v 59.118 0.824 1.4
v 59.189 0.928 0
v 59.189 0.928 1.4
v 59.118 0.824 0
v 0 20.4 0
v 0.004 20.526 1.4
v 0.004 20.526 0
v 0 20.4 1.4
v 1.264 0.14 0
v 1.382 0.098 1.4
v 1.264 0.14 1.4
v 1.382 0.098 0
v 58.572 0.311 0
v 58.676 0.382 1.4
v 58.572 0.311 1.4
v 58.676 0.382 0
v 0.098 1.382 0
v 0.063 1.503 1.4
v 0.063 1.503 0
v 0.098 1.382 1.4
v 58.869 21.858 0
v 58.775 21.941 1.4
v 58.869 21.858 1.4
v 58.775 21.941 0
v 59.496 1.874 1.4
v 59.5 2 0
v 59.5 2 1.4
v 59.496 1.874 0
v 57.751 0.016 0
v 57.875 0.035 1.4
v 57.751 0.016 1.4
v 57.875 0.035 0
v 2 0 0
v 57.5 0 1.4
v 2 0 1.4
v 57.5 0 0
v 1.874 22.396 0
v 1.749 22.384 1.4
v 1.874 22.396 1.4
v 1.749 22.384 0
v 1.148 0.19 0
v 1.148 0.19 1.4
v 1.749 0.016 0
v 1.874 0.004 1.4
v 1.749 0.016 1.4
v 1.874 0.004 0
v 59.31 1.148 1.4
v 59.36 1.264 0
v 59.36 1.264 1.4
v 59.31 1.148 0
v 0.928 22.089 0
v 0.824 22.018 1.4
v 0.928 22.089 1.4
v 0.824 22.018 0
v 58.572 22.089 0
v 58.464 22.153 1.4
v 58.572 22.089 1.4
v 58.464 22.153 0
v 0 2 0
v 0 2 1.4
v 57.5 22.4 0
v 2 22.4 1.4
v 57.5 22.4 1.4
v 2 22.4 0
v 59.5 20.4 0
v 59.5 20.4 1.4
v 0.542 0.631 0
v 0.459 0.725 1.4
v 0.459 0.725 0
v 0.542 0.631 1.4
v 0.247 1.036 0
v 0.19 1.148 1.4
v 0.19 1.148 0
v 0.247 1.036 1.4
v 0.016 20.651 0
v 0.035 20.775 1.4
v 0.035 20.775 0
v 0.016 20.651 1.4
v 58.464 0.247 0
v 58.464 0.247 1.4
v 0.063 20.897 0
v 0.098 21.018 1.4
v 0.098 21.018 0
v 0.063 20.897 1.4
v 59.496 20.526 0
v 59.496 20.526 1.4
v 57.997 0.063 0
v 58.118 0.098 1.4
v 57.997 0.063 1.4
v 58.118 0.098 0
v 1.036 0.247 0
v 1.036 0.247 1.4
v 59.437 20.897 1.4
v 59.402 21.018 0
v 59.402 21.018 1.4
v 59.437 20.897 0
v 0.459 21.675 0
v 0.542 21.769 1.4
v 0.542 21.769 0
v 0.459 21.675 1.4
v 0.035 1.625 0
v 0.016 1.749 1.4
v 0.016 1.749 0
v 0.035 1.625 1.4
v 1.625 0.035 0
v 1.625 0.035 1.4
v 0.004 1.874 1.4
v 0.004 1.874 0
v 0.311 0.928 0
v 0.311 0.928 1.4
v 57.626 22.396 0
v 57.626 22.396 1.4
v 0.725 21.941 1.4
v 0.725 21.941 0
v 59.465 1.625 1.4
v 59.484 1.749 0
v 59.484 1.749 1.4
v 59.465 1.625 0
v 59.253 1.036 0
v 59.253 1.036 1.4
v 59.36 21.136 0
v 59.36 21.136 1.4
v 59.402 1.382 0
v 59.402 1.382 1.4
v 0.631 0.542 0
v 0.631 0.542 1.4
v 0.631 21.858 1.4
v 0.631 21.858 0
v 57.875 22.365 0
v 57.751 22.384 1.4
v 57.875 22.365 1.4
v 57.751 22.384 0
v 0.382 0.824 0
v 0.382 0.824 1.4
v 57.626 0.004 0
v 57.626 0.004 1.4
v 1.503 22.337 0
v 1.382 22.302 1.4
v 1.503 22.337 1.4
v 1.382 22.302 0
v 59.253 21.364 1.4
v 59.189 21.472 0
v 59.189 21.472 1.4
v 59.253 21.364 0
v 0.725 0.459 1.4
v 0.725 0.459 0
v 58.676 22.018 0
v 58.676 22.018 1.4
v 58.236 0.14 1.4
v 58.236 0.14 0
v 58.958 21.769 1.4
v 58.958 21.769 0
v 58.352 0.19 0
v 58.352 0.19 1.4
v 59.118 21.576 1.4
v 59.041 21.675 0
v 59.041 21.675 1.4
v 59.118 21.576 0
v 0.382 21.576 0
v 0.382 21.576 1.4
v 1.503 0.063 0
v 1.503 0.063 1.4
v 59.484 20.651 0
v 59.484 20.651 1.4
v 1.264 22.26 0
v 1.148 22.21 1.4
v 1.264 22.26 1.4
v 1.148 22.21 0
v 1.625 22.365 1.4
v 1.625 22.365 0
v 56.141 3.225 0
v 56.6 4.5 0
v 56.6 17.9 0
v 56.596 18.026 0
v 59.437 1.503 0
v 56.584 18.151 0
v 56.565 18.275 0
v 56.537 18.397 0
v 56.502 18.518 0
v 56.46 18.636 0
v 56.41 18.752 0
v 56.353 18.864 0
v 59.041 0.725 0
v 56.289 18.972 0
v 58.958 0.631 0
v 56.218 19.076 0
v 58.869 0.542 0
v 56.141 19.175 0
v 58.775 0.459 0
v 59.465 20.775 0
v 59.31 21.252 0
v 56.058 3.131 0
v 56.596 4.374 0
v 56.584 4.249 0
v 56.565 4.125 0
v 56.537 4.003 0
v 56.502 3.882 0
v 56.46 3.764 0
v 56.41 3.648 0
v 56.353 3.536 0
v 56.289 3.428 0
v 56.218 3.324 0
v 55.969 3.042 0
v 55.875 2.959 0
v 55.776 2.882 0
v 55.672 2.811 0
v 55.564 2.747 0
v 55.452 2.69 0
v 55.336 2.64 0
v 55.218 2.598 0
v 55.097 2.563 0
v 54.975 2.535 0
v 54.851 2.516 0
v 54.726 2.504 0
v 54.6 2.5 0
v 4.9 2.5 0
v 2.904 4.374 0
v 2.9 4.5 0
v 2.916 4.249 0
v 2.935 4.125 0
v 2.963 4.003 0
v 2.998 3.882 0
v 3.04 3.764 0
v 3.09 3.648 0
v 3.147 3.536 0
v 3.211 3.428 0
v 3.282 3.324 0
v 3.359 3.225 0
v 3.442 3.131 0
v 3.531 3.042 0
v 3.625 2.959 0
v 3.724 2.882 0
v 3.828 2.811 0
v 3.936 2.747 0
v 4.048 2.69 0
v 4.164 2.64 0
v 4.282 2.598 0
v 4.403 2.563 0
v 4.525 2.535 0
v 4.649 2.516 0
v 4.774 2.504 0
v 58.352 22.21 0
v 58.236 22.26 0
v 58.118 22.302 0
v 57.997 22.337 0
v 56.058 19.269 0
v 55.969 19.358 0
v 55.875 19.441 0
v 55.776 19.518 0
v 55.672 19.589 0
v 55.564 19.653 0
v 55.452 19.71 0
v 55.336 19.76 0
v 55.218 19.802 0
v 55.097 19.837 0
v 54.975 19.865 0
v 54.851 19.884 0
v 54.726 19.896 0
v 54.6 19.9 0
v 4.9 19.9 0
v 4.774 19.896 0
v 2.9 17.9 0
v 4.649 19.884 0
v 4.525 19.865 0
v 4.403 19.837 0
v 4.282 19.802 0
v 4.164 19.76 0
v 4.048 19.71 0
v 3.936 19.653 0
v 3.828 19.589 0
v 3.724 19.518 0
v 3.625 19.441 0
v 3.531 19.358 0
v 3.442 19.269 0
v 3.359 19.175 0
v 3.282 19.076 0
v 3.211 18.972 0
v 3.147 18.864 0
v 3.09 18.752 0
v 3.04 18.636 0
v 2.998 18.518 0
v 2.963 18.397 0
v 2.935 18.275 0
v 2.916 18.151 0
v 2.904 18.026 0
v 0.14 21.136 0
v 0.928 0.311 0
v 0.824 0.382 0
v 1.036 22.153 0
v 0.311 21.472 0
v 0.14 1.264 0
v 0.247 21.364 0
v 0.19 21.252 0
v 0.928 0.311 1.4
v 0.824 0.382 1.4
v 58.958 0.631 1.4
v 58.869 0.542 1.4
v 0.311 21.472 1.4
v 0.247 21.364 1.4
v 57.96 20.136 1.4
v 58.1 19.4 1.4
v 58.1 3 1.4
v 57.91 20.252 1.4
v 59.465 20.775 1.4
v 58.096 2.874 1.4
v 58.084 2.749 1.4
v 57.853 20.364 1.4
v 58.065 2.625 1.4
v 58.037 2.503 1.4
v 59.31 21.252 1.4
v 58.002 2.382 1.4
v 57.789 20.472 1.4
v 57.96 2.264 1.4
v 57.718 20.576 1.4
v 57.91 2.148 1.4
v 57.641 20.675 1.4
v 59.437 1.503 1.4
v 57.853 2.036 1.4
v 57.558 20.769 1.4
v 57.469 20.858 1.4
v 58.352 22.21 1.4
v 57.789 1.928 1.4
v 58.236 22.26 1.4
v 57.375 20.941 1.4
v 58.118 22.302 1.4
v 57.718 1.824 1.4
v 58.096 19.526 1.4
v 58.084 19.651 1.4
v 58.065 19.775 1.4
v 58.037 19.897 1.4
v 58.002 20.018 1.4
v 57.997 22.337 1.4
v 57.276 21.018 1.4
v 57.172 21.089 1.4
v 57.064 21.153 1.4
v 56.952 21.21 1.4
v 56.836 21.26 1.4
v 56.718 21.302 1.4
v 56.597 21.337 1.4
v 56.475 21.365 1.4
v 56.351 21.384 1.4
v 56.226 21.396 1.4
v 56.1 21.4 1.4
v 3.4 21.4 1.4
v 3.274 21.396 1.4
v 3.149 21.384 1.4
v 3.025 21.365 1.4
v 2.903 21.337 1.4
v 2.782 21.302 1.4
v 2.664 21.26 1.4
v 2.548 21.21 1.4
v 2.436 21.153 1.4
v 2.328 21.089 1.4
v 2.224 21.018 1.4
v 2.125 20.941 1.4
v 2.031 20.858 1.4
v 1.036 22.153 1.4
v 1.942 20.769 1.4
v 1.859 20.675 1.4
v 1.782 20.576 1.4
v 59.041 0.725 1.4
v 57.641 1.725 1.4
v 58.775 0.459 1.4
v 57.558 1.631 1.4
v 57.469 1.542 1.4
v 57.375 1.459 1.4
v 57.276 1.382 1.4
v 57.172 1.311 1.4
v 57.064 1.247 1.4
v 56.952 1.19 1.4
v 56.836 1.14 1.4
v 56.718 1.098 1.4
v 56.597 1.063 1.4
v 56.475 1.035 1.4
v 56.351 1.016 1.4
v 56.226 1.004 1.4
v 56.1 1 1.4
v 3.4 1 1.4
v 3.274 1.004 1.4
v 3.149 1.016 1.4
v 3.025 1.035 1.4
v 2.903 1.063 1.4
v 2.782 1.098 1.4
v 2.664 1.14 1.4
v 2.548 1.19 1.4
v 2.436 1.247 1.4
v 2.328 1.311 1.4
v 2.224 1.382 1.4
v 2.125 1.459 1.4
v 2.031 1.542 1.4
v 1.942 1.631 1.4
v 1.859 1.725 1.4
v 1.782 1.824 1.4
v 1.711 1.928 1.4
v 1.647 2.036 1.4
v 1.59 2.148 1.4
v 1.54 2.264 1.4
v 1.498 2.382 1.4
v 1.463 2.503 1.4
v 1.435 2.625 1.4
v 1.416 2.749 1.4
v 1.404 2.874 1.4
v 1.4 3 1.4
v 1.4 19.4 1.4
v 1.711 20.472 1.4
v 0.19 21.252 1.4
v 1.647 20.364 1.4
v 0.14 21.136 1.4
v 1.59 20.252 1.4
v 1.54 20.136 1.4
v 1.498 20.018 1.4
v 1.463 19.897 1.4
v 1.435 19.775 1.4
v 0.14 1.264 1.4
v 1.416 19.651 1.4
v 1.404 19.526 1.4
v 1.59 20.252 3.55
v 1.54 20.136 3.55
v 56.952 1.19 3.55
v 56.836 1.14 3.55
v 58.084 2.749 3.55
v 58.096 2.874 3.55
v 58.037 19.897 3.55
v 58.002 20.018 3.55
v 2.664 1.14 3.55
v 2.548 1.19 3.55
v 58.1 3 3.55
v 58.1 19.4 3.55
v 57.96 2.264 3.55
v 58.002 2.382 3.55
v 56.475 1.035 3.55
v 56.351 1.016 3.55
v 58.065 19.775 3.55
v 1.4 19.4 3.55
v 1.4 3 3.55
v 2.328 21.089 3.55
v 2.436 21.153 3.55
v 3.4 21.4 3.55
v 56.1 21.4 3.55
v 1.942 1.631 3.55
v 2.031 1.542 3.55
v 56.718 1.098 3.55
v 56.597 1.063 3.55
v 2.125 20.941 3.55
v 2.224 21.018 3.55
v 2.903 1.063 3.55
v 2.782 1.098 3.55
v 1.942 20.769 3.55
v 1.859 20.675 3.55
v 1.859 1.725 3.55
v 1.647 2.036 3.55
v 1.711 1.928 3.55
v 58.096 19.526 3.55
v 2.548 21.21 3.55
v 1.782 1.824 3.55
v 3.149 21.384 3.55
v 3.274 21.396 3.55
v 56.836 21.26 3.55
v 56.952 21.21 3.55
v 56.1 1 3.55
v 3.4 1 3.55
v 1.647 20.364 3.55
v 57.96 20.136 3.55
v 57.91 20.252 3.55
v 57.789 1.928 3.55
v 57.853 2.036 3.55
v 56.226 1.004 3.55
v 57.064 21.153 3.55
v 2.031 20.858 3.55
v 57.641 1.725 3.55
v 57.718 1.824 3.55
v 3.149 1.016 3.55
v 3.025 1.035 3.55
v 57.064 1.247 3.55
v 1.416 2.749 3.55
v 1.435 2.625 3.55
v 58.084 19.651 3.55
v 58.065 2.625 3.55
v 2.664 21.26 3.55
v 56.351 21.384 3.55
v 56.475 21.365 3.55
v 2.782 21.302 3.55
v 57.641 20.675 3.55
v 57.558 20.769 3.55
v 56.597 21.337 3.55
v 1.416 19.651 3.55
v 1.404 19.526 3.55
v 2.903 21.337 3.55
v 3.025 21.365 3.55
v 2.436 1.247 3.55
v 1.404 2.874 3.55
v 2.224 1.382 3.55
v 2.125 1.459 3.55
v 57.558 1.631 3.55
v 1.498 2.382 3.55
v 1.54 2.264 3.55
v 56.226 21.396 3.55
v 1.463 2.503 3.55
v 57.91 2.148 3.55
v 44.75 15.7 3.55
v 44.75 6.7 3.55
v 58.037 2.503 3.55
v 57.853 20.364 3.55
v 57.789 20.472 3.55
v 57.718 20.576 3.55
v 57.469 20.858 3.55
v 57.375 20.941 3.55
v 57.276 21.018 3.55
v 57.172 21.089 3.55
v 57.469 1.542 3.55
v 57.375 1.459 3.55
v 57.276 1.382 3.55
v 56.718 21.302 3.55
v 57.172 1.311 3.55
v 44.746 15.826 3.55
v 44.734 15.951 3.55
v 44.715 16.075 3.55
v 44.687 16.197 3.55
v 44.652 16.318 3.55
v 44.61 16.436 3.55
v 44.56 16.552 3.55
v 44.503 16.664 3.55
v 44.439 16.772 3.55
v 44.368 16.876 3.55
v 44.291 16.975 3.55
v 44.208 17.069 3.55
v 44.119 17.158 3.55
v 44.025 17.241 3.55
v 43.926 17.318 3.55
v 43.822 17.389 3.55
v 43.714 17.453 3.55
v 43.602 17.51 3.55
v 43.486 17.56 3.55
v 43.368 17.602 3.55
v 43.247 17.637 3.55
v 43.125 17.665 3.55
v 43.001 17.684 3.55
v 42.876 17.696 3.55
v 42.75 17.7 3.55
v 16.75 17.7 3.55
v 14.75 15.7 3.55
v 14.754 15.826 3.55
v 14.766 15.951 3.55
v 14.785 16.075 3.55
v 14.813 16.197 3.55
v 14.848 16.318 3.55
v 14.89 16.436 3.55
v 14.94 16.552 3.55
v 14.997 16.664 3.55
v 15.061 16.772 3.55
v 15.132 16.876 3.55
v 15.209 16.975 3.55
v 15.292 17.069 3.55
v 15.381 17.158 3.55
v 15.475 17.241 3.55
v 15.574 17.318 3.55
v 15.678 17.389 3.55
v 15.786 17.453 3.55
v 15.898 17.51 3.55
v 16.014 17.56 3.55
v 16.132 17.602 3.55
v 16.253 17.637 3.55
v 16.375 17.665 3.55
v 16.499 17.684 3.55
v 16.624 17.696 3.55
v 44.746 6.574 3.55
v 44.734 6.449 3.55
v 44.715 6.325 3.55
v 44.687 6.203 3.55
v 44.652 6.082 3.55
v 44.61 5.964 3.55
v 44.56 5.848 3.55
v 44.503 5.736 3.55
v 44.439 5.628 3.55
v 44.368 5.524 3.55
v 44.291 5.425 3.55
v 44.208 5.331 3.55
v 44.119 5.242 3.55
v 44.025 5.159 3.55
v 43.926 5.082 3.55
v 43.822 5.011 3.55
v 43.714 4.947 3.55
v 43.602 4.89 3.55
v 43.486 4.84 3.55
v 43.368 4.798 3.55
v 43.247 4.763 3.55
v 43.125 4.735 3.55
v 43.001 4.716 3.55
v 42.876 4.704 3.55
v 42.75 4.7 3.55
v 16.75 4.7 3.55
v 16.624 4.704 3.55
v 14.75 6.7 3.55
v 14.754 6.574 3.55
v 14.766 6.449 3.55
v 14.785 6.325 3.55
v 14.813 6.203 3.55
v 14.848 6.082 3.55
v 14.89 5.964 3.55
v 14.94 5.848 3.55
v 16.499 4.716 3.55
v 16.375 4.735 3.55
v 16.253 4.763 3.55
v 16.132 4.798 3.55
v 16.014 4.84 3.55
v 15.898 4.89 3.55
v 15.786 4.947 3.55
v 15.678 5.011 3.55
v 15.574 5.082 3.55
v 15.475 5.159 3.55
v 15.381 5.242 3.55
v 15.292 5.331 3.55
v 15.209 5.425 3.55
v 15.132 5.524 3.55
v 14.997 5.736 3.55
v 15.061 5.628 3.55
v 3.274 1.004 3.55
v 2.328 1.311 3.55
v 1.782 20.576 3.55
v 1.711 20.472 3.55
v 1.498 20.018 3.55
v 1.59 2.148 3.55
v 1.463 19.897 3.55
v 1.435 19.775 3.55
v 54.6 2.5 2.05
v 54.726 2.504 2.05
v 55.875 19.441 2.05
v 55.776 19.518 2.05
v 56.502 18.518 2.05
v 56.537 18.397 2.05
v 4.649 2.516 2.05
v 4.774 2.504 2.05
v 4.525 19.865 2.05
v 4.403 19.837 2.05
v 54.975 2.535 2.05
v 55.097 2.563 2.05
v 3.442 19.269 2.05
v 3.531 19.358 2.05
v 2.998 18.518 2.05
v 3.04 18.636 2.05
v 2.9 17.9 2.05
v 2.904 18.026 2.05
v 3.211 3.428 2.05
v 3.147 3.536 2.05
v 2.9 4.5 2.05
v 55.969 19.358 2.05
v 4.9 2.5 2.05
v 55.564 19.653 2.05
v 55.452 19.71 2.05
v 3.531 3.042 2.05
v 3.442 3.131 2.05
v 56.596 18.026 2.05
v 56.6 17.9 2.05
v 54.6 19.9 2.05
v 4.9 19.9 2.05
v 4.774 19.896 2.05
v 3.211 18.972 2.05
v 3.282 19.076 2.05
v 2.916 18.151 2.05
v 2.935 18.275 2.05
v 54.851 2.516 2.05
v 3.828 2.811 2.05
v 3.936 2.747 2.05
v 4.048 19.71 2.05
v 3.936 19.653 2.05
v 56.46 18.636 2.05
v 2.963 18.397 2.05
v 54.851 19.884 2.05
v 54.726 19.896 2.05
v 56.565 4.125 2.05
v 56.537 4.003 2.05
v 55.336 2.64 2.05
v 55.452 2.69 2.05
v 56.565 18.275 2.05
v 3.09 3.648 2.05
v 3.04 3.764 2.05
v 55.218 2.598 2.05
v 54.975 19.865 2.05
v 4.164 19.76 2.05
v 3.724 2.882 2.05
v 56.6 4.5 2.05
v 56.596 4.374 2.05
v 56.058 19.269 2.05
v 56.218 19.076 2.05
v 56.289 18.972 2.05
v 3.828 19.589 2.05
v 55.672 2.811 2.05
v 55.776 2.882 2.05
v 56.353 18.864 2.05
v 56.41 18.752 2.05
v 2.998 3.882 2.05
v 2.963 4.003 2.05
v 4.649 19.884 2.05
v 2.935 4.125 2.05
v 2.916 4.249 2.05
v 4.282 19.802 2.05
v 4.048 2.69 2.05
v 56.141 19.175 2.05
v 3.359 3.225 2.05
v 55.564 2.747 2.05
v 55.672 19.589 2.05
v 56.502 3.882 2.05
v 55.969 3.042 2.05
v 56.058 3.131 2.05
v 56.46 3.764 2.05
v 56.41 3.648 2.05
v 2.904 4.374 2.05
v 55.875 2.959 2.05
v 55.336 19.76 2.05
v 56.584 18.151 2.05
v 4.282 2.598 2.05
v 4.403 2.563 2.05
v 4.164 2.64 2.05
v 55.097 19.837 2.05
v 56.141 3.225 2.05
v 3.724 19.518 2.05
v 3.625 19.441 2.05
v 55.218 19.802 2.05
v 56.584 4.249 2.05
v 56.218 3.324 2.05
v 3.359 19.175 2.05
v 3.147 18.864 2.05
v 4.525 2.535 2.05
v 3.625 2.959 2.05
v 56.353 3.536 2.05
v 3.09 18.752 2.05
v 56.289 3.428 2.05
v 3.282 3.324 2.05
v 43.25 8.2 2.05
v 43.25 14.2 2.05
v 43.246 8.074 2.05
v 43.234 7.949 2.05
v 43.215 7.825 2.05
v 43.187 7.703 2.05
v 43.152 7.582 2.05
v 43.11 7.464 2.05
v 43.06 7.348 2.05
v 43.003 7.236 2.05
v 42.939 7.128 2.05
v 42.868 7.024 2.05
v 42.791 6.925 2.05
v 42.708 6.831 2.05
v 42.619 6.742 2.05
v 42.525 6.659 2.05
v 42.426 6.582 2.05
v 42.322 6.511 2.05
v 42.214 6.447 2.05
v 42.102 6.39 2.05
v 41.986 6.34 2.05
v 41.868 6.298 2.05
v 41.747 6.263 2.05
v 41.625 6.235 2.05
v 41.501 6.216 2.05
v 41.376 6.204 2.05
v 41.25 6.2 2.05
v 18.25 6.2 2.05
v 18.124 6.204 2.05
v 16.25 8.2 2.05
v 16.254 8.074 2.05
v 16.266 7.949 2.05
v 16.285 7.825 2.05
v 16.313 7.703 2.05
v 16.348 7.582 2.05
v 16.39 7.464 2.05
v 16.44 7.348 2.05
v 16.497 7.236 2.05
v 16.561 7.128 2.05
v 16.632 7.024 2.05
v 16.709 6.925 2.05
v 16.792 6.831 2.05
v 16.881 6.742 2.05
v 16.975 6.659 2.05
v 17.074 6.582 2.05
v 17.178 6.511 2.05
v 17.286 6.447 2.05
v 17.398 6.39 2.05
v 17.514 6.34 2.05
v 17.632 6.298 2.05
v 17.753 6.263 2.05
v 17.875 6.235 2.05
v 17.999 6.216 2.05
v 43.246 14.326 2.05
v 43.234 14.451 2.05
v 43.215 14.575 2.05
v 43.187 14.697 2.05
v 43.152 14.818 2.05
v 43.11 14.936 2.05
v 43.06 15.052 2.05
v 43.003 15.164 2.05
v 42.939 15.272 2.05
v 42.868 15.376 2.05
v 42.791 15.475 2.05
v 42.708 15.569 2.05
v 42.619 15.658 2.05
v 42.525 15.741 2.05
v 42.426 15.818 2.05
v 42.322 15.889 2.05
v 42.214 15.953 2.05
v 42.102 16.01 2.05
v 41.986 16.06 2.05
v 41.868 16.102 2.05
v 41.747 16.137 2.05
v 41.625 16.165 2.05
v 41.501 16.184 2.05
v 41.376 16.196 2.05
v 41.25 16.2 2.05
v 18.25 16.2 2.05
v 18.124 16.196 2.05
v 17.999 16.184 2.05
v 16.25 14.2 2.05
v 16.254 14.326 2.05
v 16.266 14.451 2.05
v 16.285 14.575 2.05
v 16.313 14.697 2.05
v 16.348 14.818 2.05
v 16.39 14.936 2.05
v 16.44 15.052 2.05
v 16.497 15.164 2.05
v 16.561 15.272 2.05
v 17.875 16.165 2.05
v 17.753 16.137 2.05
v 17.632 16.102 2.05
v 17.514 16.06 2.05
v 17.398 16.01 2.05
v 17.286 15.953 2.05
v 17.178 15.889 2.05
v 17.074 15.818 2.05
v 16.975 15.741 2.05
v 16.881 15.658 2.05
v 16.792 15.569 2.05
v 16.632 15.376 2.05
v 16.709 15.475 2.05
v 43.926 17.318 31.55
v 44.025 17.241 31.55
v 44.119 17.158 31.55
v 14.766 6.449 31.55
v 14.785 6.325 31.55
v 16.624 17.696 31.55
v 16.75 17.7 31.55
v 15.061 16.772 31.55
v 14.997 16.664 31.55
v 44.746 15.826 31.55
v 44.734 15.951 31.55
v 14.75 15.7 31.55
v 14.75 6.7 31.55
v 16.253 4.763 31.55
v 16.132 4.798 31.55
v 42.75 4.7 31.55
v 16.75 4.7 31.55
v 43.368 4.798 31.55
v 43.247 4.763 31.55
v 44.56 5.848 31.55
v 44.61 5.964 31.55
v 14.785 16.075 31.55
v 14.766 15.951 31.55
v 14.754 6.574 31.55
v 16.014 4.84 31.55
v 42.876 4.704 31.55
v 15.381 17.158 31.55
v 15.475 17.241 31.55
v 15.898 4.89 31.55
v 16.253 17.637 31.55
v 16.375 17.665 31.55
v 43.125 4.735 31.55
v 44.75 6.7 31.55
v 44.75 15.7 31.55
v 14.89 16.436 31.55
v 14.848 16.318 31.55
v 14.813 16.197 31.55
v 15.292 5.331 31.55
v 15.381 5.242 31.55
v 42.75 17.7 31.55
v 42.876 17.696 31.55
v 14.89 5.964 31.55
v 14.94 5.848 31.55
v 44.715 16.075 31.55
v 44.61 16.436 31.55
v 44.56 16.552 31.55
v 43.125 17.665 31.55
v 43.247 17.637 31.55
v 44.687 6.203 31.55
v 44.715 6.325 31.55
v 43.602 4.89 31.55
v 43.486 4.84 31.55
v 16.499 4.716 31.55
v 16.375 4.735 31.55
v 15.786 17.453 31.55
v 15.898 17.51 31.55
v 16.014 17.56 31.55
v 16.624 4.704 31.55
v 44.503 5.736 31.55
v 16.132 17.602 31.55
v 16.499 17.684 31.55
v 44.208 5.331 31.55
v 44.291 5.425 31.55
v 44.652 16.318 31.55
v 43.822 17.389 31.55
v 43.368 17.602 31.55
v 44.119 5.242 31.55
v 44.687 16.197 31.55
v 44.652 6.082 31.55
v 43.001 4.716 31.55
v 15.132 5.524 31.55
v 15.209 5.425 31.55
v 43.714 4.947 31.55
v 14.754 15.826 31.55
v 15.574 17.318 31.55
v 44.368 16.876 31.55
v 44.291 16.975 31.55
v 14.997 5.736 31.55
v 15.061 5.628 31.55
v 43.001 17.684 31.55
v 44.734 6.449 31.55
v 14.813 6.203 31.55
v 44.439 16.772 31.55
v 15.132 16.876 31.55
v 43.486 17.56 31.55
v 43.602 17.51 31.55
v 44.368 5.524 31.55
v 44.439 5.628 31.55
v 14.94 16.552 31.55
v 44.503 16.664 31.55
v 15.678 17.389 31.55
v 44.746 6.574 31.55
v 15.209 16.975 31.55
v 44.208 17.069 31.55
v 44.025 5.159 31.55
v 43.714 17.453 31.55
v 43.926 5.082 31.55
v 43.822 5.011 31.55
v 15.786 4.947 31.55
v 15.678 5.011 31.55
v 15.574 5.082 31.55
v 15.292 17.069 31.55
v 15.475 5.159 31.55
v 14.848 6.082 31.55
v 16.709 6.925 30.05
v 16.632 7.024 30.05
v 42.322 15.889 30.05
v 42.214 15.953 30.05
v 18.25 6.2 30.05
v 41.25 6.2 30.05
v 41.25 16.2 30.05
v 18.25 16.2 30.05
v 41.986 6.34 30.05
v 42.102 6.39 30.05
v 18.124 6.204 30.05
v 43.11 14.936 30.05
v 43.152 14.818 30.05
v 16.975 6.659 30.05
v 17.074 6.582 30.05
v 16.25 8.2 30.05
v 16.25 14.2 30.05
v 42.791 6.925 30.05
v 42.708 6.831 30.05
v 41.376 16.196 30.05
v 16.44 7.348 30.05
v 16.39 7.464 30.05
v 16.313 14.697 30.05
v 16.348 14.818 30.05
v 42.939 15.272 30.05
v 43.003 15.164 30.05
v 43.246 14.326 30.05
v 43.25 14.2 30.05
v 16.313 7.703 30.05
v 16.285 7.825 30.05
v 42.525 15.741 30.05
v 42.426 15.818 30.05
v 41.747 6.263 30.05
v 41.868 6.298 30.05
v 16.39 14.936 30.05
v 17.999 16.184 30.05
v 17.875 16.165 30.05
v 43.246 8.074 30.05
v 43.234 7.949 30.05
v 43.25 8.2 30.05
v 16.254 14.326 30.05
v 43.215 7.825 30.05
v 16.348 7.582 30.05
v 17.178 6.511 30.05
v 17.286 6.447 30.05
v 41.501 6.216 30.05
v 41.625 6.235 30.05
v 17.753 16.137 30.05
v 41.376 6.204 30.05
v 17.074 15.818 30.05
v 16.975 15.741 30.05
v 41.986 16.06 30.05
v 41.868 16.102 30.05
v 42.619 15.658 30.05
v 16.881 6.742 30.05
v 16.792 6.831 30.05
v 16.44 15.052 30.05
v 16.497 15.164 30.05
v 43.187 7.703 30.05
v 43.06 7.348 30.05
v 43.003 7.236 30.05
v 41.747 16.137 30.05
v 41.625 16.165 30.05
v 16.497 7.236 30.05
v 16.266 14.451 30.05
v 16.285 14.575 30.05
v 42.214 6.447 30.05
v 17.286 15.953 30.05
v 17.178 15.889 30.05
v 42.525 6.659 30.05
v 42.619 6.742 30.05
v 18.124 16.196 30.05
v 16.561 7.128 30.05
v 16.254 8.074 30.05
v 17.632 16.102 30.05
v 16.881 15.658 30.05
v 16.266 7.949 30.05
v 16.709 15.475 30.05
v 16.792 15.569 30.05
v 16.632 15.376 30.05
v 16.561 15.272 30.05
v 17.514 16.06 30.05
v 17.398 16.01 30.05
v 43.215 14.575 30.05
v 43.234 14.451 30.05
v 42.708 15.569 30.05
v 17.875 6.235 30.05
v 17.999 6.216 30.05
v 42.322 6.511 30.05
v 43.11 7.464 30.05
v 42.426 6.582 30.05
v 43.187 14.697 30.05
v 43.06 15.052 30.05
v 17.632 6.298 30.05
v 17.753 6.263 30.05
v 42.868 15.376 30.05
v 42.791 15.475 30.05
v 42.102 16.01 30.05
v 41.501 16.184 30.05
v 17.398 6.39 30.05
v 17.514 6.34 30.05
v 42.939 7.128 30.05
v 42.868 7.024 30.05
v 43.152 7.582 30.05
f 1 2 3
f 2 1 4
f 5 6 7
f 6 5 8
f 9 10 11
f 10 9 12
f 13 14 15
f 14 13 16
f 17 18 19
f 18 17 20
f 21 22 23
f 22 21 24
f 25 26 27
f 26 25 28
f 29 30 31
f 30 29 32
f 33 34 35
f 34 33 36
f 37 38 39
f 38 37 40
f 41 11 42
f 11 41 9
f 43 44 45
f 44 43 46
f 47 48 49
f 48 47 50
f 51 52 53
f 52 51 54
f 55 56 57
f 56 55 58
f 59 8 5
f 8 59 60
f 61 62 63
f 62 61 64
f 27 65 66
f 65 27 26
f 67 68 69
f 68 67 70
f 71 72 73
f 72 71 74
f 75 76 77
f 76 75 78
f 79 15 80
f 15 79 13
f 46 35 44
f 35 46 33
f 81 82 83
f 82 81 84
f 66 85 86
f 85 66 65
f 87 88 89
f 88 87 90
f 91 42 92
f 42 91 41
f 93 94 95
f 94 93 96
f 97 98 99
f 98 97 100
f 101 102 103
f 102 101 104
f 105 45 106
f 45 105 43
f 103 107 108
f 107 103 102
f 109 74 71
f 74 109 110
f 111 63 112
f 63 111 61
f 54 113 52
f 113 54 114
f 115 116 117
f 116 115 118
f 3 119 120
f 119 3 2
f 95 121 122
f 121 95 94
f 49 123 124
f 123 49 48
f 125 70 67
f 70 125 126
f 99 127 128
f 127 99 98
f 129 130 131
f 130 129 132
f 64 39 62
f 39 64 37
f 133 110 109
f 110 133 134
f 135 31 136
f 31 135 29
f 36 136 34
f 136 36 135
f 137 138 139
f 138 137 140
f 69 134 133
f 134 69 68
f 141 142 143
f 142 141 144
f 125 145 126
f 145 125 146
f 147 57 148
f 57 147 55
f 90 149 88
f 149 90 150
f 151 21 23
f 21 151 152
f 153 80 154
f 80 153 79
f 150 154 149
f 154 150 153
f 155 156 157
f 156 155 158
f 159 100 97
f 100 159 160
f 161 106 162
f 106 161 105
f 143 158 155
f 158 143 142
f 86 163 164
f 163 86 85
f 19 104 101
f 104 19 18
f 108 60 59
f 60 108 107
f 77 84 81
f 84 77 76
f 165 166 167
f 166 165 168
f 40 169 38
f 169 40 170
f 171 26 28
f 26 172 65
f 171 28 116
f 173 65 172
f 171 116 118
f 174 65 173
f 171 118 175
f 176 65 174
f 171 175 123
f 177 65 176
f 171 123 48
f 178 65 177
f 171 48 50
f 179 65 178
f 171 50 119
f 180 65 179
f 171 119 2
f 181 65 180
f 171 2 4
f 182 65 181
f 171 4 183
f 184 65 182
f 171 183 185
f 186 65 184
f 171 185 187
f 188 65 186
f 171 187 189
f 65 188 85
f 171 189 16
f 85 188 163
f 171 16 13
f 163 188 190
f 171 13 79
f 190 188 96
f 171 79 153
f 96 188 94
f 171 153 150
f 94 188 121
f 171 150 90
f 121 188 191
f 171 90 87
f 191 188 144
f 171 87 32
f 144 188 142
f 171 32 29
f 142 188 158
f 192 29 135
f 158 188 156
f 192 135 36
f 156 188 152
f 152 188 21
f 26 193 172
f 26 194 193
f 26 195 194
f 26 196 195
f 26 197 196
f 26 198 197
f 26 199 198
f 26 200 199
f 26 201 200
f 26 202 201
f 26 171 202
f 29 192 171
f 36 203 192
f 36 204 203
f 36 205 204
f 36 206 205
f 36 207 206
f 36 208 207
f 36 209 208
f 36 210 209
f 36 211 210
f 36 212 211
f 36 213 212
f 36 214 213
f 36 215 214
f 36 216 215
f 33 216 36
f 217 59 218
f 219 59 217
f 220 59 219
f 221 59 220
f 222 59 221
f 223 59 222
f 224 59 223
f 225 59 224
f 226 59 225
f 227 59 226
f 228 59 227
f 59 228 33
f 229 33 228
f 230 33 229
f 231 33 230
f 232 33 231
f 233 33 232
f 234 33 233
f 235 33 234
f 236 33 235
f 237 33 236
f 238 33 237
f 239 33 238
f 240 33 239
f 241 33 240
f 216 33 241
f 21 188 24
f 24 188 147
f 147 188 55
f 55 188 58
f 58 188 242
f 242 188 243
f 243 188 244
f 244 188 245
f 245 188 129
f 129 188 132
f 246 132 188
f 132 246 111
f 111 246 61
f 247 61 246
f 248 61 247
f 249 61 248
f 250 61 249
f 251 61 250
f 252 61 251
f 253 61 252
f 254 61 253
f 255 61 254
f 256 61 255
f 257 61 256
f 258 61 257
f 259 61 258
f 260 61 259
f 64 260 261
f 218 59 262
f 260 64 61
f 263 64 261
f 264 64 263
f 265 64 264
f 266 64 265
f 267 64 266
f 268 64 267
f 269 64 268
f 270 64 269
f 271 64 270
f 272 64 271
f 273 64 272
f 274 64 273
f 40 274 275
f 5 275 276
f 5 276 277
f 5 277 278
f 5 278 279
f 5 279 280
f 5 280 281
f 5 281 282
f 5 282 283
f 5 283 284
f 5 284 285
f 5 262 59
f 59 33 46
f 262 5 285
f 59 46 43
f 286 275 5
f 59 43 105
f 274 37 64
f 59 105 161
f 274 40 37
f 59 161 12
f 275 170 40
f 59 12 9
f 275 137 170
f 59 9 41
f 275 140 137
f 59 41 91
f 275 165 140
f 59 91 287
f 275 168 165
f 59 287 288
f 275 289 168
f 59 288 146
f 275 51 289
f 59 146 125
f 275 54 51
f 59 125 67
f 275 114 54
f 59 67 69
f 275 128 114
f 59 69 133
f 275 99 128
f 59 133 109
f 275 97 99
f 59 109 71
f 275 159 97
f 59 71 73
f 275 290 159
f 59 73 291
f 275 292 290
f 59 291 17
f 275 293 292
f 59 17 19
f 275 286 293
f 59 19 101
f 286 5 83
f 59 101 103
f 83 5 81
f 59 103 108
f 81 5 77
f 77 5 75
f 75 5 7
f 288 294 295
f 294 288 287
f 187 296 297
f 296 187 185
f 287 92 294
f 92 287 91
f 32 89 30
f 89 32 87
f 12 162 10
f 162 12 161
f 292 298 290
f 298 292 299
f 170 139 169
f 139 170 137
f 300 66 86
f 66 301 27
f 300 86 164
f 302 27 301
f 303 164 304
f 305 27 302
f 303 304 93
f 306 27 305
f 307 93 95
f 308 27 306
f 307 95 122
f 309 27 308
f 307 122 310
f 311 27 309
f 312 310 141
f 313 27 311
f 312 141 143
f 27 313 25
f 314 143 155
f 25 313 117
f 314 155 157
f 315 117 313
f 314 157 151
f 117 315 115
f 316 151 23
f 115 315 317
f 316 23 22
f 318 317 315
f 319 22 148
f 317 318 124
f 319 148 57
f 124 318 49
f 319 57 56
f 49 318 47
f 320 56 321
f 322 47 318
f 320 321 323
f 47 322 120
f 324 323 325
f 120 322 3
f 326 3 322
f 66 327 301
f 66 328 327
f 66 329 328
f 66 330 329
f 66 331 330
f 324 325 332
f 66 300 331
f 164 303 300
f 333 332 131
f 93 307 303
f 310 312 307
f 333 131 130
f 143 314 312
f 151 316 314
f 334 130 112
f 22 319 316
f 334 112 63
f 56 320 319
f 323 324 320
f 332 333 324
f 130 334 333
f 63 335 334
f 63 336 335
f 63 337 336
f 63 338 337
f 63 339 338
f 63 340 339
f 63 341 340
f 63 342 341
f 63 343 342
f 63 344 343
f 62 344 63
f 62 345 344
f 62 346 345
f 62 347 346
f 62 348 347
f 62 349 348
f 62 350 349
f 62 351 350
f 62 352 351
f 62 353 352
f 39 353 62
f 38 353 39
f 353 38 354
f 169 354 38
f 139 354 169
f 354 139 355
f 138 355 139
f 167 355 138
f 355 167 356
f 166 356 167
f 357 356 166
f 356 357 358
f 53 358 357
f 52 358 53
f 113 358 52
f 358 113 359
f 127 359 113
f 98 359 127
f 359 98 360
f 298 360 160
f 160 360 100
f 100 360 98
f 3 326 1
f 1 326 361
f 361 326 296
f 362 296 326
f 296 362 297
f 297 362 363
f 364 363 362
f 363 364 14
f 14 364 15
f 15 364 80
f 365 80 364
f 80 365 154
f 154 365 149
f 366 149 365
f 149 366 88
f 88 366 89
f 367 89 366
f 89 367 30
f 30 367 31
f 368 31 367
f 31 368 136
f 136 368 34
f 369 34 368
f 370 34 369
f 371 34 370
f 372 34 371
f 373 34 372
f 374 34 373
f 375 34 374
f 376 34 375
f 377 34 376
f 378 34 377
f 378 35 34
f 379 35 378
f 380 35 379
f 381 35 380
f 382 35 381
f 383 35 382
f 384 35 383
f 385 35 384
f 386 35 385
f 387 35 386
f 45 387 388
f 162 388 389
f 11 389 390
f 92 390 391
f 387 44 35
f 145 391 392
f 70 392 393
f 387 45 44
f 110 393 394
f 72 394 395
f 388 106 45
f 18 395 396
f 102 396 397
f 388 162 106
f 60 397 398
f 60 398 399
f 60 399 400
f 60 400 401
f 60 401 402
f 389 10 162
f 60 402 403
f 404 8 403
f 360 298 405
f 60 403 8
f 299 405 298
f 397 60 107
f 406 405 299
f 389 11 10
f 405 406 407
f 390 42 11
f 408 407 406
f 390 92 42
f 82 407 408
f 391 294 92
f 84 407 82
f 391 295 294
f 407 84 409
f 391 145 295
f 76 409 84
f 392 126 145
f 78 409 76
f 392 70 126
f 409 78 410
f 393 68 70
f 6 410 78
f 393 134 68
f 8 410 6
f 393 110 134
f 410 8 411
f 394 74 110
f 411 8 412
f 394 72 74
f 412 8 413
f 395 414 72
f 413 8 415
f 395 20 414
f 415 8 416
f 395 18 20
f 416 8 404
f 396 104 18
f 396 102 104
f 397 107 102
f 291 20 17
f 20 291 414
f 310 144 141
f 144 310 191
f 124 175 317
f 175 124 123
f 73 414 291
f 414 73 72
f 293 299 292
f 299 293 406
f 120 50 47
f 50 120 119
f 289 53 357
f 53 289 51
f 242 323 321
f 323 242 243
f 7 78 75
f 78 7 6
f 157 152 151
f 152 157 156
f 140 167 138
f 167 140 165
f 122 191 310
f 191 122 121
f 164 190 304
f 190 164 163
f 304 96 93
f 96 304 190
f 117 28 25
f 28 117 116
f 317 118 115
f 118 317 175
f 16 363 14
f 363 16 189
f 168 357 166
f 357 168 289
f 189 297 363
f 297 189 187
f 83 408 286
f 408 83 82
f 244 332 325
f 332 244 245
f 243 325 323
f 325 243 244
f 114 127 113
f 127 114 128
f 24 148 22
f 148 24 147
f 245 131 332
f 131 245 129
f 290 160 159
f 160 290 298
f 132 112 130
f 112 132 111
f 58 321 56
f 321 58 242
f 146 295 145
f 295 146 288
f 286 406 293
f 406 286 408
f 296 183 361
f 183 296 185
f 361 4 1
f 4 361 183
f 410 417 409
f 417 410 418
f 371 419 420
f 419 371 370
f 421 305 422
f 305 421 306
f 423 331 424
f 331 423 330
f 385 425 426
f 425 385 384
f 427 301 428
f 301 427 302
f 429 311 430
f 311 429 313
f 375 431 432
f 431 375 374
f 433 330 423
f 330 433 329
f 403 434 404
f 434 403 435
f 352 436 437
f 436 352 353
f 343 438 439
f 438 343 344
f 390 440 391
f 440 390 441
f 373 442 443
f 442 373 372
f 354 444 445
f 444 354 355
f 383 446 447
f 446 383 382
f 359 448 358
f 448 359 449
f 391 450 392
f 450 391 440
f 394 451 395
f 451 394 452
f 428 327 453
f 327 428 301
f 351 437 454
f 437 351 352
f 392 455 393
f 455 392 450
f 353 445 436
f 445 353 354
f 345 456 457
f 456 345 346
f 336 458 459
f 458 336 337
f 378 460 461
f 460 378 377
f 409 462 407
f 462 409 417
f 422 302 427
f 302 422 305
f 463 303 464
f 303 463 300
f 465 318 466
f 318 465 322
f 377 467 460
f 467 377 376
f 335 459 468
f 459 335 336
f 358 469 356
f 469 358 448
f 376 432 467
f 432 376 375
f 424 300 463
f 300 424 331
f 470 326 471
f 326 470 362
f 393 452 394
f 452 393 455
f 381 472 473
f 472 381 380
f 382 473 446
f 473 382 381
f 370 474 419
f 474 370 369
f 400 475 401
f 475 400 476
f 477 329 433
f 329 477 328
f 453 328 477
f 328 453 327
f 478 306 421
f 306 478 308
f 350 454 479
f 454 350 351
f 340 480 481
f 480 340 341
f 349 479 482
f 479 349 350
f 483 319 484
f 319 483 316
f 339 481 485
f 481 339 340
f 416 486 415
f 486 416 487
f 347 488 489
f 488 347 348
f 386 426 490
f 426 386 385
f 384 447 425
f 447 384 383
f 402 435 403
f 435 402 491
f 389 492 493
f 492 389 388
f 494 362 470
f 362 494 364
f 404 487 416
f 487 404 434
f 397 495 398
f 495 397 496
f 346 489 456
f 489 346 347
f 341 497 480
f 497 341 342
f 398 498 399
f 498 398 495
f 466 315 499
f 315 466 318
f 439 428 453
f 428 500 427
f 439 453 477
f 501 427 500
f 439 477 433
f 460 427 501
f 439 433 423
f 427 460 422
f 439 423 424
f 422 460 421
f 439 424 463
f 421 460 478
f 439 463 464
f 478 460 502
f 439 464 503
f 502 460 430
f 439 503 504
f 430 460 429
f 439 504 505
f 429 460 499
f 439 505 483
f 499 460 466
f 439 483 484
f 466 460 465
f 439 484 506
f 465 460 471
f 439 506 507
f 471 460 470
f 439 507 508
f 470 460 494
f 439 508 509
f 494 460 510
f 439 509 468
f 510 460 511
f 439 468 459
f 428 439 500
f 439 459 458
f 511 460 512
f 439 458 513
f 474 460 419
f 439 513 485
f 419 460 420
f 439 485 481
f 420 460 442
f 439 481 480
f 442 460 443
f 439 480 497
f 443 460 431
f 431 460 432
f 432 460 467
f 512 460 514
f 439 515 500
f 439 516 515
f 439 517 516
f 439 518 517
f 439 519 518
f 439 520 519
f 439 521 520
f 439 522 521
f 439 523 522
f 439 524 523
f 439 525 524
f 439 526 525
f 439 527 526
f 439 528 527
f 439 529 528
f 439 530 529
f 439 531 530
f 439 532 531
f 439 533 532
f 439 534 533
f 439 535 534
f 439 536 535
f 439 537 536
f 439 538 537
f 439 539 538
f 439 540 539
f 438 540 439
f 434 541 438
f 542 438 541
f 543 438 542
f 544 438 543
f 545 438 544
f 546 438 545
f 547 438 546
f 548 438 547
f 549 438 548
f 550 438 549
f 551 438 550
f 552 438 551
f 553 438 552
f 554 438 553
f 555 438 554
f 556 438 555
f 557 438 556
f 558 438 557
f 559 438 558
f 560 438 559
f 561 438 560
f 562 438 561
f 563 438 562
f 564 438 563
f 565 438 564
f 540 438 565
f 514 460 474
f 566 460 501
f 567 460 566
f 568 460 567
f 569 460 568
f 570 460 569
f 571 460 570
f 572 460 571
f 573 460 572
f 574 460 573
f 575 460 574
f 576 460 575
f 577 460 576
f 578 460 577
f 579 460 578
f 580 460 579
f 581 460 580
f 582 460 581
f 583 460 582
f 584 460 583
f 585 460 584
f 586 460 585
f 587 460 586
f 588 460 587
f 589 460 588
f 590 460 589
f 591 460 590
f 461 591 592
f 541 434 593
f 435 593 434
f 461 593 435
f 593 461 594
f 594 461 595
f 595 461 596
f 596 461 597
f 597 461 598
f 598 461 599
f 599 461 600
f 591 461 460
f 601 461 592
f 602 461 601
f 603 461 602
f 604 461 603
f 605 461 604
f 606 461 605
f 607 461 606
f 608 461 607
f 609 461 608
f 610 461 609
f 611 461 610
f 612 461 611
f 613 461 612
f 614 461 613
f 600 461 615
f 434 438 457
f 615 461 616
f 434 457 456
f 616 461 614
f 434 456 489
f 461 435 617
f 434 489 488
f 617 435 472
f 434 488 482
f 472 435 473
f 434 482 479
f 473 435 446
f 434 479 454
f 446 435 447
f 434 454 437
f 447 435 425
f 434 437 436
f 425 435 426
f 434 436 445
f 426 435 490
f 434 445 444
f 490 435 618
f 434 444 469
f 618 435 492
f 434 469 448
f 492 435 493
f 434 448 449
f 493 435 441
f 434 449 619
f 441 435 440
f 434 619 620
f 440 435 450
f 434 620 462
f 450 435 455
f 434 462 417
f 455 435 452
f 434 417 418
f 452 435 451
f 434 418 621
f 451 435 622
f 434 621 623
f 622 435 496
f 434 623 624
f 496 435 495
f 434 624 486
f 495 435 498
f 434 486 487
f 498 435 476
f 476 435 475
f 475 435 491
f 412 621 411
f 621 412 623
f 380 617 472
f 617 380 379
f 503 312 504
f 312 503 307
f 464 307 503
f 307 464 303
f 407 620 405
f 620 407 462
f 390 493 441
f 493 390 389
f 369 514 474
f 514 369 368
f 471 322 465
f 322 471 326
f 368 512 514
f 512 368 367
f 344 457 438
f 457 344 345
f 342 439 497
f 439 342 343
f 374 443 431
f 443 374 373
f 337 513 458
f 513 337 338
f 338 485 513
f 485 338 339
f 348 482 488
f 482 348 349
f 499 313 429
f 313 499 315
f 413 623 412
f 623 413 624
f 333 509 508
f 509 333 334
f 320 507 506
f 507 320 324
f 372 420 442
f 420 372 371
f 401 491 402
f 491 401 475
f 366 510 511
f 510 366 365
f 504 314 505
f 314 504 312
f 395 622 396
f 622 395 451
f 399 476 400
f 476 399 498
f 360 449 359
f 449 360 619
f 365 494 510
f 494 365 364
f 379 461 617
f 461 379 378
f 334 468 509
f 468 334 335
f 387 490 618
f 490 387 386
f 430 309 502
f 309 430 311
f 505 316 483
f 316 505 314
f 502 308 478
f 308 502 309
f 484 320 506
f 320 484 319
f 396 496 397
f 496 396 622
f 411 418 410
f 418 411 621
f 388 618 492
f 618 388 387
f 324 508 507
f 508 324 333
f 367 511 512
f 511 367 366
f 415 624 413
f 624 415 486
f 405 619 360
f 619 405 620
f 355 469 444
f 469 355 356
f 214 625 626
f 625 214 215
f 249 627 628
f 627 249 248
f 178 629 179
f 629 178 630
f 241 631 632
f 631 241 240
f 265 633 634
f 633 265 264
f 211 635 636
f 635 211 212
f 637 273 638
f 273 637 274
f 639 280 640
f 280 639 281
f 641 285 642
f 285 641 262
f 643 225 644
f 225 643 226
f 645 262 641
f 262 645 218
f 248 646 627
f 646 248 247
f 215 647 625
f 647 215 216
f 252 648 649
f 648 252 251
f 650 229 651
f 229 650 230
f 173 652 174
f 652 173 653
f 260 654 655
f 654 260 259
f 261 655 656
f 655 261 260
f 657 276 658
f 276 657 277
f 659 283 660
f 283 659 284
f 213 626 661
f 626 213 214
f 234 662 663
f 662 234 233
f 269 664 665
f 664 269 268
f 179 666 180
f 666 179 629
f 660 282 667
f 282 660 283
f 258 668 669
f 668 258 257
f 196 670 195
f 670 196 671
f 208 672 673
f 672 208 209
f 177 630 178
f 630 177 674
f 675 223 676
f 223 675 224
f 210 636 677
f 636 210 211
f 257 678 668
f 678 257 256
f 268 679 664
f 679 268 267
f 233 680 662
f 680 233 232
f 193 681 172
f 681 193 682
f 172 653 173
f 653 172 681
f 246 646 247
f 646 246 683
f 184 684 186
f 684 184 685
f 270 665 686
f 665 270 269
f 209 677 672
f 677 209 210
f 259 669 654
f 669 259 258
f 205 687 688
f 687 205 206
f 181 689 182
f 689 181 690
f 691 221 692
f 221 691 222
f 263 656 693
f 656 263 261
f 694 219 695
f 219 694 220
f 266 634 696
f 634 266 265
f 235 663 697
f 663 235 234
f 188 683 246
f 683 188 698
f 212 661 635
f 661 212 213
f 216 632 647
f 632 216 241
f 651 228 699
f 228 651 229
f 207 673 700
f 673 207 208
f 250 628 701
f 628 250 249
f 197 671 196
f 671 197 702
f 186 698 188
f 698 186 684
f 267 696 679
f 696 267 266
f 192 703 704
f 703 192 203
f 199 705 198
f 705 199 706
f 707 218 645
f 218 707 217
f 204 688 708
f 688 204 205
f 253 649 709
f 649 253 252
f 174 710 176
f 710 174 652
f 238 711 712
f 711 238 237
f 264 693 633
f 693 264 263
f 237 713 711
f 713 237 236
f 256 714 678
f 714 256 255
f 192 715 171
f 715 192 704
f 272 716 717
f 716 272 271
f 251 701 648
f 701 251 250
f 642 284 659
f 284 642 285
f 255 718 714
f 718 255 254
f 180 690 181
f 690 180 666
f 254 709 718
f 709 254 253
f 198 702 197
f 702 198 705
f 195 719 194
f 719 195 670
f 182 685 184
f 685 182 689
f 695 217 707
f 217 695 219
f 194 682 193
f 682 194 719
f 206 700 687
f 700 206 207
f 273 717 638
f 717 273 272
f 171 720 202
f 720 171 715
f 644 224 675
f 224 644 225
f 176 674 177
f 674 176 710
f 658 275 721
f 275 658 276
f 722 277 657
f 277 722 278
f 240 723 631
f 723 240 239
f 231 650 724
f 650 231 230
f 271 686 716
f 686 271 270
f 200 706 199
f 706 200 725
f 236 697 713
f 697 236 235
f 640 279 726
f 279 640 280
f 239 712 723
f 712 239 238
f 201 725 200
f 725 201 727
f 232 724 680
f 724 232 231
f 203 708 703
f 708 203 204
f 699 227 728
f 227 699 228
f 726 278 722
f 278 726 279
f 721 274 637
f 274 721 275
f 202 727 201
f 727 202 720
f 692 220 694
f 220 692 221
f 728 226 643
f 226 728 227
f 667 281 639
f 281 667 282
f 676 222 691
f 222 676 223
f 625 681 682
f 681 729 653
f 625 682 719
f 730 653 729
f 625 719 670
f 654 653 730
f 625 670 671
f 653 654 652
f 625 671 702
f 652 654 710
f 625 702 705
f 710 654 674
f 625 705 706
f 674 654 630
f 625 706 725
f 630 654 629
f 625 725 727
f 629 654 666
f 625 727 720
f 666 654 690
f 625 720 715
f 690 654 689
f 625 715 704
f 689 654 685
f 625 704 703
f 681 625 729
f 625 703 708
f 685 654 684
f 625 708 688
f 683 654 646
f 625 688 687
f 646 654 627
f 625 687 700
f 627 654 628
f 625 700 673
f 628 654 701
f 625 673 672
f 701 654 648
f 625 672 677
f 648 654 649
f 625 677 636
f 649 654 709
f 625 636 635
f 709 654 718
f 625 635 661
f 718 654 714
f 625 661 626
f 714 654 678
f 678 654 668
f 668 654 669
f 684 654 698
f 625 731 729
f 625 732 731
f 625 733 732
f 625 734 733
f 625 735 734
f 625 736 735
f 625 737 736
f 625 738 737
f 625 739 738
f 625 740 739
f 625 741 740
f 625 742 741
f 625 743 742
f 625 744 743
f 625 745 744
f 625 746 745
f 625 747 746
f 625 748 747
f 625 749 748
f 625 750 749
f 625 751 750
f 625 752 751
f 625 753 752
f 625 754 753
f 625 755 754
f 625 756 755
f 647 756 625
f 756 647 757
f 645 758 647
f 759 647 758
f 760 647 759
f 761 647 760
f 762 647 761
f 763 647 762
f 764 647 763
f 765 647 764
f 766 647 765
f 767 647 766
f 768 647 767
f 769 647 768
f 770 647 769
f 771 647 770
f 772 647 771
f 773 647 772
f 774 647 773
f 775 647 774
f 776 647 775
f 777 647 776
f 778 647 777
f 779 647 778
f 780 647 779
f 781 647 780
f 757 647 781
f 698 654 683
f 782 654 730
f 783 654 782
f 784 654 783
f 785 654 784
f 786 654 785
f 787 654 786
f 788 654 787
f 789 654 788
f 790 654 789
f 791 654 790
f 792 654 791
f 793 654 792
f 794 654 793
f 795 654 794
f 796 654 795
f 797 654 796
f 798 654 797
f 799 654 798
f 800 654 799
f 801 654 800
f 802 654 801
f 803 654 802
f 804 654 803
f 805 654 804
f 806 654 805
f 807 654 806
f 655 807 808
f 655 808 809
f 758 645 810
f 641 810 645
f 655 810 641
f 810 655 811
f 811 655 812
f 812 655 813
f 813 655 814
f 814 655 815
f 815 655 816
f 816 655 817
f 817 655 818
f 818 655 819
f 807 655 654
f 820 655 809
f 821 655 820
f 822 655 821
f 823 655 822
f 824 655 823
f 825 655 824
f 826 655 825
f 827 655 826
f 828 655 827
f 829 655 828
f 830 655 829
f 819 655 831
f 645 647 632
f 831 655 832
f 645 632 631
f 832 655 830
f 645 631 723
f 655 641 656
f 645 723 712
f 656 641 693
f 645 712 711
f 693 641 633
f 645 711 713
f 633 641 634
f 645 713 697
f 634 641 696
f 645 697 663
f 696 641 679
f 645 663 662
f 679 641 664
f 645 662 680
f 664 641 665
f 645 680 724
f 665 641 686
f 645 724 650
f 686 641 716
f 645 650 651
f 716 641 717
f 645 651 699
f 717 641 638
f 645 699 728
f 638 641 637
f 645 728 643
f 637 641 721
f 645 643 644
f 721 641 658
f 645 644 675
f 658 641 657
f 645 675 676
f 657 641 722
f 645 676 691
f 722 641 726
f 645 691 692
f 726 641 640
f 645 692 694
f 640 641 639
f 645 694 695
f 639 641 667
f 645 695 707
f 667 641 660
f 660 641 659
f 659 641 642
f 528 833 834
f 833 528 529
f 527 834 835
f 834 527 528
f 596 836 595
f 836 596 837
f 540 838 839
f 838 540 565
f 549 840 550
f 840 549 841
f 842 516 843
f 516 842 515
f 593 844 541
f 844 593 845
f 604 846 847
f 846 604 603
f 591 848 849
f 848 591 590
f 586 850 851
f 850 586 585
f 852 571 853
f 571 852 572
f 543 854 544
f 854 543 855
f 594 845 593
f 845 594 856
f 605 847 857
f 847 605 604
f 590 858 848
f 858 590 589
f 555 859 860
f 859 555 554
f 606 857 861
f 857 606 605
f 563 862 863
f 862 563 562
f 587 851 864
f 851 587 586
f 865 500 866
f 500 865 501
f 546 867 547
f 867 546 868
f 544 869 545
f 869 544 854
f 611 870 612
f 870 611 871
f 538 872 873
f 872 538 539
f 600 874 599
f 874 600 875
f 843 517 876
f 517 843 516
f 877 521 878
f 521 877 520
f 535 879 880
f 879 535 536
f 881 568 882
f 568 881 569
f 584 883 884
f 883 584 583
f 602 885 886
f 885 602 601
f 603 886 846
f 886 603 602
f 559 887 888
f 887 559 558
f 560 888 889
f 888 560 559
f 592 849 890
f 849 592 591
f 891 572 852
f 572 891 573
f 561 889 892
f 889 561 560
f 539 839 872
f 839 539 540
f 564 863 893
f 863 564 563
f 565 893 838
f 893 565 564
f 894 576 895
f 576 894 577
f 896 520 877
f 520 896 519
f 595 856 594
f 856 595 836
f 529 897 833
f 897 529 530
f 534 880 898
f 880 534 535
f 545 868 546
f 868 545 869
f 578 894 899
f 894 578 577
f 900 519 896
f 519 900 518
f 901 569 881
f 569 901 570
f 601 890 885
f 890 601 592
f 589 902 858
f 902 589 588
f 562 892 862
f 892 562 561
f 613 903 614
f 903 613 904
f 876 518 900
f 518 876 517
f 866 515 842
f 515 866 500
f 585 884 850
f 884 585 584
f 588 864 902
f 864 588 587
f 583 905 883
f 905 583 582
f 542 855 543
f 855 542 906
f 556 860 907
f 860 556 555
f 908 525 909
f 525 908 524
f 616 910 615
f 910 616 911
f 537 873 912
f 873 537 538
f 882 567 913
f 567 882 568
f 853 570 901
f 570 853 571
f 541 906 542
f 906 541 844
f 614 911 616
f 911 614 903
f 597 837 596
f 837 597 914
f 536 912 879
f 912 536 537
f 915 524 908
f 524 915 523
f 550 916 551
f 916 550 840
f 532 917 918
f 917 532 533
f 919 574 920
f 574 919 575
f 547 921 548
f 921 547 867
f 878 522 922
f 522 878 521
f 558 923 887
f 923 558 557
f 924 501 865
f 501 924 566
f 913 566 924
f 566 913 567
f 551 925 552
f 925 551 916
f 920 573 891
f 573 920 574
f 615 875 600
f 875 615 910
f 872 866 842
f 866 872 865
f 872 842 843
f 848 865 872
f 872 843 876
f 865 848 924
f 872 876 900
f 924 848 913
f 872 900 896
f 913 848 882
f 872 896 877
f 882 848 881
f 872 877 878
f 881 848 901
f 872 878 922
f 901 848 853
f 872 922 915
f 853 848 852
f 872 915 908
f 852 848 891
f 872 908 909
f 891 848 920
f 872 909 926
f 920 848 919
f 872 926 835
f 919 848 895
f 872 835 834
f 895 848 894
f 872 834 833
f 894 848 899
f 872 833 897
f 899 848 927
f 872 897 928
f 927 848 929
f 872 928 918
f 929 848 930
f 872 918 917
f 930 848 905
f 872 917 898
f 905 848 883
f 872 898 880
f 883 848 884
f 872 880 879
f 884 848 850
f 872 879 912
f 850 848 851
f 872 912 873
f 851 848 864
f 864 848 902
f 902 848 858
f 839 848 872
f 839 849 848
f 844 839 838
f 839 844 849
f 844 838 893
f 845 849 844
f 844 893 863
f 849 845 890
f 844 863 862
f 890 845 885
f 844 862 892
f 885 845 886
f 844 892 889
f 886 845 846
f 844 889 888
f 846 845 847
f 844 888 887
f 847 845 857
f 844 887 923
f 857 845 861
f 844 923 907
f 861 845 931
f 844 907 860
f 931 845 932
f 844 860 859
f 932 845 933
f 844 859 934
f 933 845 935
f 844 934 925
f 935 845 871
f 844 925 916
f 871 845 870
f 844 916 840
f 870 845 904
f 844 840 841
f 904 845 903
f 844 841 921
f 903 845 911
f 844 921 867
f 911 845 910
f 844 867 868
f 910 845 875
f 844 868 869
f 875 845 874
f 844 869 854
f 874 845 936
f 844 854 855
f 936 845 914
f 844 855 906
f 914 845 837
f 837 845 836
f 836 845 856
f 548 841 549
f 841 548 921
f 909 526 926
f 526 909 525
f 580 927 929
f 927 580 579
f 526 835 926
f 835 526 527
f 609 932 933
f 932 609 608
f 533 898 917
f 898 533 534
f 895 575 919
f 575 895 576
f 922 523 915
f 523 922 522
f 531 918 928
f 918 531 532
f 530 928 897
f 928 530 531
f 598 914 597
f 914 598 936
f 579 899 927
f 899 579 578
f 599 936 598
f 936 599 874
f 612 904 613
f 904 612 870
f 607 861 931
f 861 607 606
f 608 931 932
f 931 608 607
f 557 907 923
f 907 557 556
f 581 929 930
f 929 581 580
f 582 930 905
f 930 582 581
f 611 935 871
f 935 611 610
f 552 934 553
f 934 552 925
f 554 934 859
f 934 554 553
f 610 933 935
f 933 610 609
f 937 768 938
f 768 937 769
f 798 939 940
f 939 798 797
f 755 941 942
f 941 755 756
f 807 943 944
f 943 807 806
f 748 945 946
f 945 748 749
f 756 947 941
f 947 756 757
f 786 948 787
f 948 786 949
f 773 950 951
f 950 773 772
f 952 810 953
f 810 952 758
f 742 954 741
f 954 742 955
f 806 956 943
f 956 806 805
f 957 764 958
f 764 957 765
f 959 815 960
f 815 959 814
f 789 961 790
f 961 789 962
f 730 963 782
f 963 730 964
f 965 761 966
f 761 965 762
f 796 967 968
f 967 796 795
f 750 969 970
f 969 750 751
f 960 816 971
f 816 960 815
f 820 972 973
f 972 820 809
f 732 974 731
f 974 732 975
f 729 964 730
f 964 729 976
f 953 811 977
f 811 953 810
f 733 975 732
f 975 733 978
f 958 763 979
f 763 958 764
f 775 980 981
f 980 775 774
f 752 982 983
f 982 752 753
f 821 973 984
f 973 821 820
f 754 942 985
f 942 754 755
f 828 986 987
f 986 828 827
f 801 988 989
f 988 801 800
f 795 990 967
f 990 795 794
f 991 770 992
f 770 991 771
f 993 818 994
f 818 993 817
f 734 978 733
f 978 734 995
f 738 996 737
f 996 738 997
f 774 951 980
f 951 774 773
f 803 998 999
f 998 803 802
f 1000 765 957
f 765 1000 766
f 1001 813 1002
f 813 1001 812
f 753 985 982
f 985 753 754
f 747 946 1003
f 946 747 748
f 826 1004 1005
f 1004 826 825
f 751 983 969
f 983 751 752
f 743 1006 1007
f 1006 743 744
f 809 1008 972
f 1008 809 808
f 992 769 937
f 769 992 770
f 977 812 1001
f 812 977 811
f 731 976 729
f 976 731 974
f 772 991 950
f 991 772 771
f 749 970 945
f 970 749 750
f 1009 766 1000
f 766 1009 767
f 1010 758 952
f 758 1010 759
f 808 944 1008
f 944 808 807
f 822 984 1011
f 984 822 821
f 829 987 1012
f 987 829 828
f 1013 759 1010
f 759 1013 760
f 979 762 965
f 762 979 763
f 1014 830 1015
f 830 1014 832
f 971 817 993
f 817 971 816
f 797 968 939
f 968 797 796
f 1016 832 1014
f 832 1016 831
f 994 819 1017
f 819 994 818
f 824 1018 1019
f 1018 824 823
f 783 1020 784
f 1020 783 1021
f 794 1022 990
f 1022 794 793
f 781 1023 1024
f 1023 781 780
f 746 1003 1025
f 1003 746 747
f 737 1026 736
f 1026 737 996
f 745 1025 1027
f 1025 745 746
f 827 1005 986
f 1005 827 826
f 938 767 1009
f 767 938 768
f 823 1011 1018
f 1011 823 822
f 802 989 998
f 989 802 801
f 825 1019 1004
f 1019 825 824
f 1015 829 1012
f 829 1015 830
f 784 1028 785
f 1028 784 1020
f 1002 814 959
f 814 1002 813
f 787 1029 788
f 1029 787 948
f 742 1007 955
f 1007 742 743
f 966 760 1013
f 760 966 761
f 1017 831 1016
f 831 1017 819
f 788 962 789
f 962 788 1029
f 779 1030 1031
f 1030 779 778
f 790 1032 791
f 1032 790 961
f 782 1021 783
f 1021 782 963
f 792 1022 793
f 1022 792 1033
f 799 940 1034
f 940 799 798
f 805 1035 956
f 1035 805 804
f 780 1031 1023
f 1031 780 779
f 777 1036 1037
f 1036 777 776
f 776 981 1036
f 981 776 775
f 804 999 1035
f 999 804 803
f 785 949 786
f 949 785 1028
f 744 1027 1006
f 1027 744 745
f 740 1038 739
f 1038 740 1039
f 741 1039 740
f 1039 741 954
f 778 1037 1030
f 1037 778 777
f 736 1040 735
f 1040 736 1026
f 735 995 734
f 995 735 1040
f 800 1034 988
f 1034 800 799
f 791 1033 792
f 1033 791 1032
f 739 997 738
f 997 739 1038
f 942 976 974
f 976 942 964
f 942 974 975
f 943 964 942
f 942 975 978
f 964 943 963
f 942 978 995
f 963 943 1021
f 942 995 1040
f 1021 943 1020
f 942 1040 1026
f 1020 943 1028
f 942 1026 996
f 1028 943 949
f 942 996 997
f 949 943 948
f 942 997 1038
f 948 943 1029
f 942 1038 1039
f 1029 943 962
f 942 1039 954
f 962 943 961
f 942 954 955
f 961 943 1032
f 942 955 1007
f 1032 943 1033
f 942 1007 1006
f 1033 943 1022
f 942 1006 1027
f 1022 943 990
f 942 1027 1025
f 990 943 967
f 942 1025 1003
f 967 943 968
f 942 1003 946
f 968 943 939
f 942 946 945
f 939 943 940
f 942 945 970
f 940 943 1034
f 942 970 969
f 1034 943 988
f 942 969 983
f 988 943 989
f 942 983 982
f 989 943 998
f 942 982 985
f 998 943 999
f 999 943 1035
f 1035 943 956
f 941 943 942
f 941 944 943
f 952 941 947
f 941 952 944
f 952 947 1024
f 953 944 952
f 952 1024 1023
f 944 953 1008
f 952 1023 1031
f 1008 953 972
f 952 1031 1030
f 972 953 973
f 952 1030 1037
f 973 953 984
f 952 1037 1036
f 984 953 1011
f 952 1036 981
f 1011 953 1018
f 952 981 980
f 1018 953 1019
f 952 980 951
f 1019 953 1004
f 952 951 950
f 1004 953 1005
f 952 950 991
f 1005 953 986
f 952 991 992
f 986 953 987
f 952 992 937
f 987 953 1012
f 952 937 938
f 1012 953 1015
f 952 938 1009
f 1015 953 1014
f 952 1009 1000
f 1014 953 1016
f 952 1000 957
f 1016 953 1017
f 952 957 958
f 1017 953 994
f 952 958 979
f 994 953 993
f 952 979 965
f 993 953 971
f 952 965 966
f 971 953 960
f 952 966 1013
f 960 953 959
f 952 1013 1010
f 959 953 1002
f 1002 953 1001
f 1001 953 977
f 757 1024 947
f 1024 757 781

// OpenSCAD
length1 = 59.5;
width1  = 22.4;
height1 = 1.4;
length2 = length1 - 1.4*2;
width2  = width1  - 1.0*2;
height2 = 2.15;
thickness = 1.5;
round_r = 2.0;

ant_enc_length = 30.0;
ant_enc_width  = 28.0;
ant_enc_height = 13.0;
ant_enc_r = 2.0;
ant_enc_thickness = 1.5;

sm = 0.1;
$fn = 100;

module smoothed_cube(length, width, height, radius, smooth_type) {
    small = 0.1;
    if (smooth_type == "all") {
        translate([radius, radius, radius]) {
            minkowski() {
                cube([length-radius*2, width-radius*2, height-radius*2]);
                sphere(radius);
            };
        };
    } else {
        if (smooth_type == "height") {
            translate([radius, radius, 0]) {
                minkowski() {
                    cube([length-radius*2, width-radius*2, height-small]);
                    cylinder(r=radius, h=small);
                };
            };            
        };
        if (smooth_type == "length") {
            translate([0, radius, radius]) {
                minkowski() {
                    cube([length-small, width-radius*2, height-radius*2]);
                    rotate([0, 90, 0]) {
                        cylinder(r=radius, h=small);
                    };
                };
            };            
        };
        if (smooth_type == "width") {
            translate([radius, small, radius]) {
                minkowski() {
                    cube([length-radius*2, width-small, height-radius*2]);
                    rotate([90, 0, 0]) {
                        cylinder(r=radius, h=small);
                    };
                };
            };            
        };
    };
};

module side_cover() {
    difference() {
        union() {
            smoothed_cube(length1, width1, height1, round_r, "height");
            translate([(length1-length2)/2, (width1-width2)/2, height1-sm]) 
                smoothed_cube(length2, width2, height2+sm, round_r, "height");
        };
        translate([(length1-length2)/2+thickness, (width1-width2)/2+thickness, -sm])
            smoothed_cube(length2-thickness*2, width2-thickness*2, height1+height2-thickness+sm, round_r, "height");
    };
};

difference() {
    union() {
        side_cover();
        translate([(length1-ant_enc_length)/2.0, (width1-ant_enc_height)/2.0, height1+height2-sm])
            smoothed_cube(ant_enc_length, ant_enc_height, ant_enc_width+sm, ant_enc_r, "height");
    };
    translate([(length1-ant_enc_length)/2.0+ant_enc_thickness,(width1-ant_enc_height)/2.0+ant_enc_thickness,-sm])
        smoothed_cube(ant_enc_length-ant_enc_thickness*2, ant_enc_height-ant_enc_thickness*2, ant_enc_width-ant_enc_thickness+height1+height2+sm, ant_enc_r, "height");
};
